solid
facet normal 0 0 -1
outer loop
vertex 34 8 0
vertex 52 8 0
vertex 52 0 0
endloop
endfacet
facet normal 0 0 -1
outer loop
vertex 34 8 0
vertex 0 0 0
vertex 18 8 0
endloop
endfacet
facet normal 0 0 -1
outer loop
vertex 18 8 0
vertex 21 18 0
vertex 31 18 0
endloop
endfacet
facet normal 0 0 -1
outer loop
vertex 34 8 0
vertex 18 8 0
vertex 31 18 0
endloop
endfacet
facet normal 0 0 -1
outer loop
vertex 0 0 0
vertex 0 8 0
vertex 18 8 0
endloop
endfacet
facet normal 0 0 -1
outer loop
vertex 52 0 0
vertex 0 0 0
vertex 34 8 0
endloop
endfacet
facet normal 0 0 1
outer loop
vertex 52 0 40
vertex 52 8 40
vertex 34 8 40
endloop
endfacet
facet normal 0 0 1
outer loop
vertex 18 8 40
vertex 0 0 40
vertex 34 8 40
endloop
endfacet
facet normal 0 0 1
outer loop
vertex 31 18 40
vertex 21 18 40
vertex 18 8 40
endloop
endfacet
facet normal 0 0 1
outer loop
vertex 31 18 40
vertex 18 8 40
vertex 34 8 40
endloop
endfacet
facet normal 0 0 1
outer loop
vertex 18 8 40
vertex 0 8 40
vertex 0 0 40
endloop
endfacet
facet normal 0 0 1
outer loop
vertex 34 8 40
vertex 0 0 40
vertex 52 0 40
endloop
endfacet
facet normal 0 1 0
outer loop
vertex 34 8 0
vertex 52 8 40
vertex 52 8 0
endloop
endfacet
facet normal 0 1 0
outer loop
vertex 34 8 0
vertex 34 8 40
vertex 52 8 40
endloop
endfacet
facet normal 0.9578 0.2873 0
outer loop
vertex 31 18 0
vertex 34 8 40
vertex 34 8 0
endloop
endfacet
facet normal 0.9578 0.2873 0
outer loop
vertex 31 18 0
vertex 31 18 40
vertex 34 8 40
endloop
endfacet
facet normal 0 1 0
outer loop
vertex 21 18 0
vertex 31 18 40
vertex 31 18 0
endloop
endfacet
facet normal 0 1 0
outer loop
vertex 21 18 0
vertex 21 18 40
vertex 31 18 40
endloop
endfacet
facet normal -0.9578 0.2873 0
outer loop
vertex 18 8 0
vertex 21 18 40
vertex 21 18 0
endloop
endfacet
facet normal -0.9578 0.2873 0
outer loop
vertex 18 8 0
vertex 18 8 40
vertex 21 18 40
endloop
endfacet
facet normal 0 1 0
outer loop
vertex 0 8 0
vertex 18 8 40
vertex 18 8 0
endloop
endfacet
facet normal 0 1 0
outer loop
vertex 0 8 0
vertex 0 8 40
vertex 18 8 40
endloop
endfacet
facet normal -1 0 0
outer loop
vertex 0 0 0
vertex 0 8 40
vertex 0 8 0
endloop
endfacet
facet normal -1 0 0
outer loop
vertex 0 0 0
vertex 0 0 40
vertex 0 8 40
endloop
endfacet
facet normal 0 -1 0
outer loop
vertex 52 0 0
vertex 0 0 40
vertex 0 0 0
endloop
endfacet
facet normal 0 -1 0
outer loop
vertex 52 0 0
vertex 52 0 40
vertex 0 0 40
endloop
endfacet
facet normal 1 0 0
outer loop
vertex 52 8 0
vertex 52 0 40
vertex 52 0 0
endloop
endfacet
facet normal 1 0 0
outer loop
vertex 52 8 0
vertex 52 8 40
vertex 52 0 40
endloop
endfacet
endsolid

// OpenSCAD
$fn = 32;

// ----------------------------------------------------------------------
// V guide rail: dovetail, 52 mm wide
// ----------------------------------------------------------------------

// --- parameters (mm) ---
rail_w = 52;              // rail width, X
base_t = 8;               // base plate thickness
v_depth = 10;             // V feature depth / height
v_half_w = 8;             // half width of the V at the base face
plate_t = 40;             // rail length, Z (the extrusion height)
top_half_w = 5;           // half width at the dovetail top

dovetail_base = 2 * v_half_w;  // dovetail width at the base
dovetail_top = 2 * top_half_w;  // dovetail width at the top

profile = [[0, 0], [52, 0], [52, 8], [34, 8], [31, 18], [21, 18], [18, 8], [0, 8]];  // primary outline, 8 points, counter clockwise

// --- the one profile operation ---
linear_extrude(height = plate_t) polygon(points = profile);
